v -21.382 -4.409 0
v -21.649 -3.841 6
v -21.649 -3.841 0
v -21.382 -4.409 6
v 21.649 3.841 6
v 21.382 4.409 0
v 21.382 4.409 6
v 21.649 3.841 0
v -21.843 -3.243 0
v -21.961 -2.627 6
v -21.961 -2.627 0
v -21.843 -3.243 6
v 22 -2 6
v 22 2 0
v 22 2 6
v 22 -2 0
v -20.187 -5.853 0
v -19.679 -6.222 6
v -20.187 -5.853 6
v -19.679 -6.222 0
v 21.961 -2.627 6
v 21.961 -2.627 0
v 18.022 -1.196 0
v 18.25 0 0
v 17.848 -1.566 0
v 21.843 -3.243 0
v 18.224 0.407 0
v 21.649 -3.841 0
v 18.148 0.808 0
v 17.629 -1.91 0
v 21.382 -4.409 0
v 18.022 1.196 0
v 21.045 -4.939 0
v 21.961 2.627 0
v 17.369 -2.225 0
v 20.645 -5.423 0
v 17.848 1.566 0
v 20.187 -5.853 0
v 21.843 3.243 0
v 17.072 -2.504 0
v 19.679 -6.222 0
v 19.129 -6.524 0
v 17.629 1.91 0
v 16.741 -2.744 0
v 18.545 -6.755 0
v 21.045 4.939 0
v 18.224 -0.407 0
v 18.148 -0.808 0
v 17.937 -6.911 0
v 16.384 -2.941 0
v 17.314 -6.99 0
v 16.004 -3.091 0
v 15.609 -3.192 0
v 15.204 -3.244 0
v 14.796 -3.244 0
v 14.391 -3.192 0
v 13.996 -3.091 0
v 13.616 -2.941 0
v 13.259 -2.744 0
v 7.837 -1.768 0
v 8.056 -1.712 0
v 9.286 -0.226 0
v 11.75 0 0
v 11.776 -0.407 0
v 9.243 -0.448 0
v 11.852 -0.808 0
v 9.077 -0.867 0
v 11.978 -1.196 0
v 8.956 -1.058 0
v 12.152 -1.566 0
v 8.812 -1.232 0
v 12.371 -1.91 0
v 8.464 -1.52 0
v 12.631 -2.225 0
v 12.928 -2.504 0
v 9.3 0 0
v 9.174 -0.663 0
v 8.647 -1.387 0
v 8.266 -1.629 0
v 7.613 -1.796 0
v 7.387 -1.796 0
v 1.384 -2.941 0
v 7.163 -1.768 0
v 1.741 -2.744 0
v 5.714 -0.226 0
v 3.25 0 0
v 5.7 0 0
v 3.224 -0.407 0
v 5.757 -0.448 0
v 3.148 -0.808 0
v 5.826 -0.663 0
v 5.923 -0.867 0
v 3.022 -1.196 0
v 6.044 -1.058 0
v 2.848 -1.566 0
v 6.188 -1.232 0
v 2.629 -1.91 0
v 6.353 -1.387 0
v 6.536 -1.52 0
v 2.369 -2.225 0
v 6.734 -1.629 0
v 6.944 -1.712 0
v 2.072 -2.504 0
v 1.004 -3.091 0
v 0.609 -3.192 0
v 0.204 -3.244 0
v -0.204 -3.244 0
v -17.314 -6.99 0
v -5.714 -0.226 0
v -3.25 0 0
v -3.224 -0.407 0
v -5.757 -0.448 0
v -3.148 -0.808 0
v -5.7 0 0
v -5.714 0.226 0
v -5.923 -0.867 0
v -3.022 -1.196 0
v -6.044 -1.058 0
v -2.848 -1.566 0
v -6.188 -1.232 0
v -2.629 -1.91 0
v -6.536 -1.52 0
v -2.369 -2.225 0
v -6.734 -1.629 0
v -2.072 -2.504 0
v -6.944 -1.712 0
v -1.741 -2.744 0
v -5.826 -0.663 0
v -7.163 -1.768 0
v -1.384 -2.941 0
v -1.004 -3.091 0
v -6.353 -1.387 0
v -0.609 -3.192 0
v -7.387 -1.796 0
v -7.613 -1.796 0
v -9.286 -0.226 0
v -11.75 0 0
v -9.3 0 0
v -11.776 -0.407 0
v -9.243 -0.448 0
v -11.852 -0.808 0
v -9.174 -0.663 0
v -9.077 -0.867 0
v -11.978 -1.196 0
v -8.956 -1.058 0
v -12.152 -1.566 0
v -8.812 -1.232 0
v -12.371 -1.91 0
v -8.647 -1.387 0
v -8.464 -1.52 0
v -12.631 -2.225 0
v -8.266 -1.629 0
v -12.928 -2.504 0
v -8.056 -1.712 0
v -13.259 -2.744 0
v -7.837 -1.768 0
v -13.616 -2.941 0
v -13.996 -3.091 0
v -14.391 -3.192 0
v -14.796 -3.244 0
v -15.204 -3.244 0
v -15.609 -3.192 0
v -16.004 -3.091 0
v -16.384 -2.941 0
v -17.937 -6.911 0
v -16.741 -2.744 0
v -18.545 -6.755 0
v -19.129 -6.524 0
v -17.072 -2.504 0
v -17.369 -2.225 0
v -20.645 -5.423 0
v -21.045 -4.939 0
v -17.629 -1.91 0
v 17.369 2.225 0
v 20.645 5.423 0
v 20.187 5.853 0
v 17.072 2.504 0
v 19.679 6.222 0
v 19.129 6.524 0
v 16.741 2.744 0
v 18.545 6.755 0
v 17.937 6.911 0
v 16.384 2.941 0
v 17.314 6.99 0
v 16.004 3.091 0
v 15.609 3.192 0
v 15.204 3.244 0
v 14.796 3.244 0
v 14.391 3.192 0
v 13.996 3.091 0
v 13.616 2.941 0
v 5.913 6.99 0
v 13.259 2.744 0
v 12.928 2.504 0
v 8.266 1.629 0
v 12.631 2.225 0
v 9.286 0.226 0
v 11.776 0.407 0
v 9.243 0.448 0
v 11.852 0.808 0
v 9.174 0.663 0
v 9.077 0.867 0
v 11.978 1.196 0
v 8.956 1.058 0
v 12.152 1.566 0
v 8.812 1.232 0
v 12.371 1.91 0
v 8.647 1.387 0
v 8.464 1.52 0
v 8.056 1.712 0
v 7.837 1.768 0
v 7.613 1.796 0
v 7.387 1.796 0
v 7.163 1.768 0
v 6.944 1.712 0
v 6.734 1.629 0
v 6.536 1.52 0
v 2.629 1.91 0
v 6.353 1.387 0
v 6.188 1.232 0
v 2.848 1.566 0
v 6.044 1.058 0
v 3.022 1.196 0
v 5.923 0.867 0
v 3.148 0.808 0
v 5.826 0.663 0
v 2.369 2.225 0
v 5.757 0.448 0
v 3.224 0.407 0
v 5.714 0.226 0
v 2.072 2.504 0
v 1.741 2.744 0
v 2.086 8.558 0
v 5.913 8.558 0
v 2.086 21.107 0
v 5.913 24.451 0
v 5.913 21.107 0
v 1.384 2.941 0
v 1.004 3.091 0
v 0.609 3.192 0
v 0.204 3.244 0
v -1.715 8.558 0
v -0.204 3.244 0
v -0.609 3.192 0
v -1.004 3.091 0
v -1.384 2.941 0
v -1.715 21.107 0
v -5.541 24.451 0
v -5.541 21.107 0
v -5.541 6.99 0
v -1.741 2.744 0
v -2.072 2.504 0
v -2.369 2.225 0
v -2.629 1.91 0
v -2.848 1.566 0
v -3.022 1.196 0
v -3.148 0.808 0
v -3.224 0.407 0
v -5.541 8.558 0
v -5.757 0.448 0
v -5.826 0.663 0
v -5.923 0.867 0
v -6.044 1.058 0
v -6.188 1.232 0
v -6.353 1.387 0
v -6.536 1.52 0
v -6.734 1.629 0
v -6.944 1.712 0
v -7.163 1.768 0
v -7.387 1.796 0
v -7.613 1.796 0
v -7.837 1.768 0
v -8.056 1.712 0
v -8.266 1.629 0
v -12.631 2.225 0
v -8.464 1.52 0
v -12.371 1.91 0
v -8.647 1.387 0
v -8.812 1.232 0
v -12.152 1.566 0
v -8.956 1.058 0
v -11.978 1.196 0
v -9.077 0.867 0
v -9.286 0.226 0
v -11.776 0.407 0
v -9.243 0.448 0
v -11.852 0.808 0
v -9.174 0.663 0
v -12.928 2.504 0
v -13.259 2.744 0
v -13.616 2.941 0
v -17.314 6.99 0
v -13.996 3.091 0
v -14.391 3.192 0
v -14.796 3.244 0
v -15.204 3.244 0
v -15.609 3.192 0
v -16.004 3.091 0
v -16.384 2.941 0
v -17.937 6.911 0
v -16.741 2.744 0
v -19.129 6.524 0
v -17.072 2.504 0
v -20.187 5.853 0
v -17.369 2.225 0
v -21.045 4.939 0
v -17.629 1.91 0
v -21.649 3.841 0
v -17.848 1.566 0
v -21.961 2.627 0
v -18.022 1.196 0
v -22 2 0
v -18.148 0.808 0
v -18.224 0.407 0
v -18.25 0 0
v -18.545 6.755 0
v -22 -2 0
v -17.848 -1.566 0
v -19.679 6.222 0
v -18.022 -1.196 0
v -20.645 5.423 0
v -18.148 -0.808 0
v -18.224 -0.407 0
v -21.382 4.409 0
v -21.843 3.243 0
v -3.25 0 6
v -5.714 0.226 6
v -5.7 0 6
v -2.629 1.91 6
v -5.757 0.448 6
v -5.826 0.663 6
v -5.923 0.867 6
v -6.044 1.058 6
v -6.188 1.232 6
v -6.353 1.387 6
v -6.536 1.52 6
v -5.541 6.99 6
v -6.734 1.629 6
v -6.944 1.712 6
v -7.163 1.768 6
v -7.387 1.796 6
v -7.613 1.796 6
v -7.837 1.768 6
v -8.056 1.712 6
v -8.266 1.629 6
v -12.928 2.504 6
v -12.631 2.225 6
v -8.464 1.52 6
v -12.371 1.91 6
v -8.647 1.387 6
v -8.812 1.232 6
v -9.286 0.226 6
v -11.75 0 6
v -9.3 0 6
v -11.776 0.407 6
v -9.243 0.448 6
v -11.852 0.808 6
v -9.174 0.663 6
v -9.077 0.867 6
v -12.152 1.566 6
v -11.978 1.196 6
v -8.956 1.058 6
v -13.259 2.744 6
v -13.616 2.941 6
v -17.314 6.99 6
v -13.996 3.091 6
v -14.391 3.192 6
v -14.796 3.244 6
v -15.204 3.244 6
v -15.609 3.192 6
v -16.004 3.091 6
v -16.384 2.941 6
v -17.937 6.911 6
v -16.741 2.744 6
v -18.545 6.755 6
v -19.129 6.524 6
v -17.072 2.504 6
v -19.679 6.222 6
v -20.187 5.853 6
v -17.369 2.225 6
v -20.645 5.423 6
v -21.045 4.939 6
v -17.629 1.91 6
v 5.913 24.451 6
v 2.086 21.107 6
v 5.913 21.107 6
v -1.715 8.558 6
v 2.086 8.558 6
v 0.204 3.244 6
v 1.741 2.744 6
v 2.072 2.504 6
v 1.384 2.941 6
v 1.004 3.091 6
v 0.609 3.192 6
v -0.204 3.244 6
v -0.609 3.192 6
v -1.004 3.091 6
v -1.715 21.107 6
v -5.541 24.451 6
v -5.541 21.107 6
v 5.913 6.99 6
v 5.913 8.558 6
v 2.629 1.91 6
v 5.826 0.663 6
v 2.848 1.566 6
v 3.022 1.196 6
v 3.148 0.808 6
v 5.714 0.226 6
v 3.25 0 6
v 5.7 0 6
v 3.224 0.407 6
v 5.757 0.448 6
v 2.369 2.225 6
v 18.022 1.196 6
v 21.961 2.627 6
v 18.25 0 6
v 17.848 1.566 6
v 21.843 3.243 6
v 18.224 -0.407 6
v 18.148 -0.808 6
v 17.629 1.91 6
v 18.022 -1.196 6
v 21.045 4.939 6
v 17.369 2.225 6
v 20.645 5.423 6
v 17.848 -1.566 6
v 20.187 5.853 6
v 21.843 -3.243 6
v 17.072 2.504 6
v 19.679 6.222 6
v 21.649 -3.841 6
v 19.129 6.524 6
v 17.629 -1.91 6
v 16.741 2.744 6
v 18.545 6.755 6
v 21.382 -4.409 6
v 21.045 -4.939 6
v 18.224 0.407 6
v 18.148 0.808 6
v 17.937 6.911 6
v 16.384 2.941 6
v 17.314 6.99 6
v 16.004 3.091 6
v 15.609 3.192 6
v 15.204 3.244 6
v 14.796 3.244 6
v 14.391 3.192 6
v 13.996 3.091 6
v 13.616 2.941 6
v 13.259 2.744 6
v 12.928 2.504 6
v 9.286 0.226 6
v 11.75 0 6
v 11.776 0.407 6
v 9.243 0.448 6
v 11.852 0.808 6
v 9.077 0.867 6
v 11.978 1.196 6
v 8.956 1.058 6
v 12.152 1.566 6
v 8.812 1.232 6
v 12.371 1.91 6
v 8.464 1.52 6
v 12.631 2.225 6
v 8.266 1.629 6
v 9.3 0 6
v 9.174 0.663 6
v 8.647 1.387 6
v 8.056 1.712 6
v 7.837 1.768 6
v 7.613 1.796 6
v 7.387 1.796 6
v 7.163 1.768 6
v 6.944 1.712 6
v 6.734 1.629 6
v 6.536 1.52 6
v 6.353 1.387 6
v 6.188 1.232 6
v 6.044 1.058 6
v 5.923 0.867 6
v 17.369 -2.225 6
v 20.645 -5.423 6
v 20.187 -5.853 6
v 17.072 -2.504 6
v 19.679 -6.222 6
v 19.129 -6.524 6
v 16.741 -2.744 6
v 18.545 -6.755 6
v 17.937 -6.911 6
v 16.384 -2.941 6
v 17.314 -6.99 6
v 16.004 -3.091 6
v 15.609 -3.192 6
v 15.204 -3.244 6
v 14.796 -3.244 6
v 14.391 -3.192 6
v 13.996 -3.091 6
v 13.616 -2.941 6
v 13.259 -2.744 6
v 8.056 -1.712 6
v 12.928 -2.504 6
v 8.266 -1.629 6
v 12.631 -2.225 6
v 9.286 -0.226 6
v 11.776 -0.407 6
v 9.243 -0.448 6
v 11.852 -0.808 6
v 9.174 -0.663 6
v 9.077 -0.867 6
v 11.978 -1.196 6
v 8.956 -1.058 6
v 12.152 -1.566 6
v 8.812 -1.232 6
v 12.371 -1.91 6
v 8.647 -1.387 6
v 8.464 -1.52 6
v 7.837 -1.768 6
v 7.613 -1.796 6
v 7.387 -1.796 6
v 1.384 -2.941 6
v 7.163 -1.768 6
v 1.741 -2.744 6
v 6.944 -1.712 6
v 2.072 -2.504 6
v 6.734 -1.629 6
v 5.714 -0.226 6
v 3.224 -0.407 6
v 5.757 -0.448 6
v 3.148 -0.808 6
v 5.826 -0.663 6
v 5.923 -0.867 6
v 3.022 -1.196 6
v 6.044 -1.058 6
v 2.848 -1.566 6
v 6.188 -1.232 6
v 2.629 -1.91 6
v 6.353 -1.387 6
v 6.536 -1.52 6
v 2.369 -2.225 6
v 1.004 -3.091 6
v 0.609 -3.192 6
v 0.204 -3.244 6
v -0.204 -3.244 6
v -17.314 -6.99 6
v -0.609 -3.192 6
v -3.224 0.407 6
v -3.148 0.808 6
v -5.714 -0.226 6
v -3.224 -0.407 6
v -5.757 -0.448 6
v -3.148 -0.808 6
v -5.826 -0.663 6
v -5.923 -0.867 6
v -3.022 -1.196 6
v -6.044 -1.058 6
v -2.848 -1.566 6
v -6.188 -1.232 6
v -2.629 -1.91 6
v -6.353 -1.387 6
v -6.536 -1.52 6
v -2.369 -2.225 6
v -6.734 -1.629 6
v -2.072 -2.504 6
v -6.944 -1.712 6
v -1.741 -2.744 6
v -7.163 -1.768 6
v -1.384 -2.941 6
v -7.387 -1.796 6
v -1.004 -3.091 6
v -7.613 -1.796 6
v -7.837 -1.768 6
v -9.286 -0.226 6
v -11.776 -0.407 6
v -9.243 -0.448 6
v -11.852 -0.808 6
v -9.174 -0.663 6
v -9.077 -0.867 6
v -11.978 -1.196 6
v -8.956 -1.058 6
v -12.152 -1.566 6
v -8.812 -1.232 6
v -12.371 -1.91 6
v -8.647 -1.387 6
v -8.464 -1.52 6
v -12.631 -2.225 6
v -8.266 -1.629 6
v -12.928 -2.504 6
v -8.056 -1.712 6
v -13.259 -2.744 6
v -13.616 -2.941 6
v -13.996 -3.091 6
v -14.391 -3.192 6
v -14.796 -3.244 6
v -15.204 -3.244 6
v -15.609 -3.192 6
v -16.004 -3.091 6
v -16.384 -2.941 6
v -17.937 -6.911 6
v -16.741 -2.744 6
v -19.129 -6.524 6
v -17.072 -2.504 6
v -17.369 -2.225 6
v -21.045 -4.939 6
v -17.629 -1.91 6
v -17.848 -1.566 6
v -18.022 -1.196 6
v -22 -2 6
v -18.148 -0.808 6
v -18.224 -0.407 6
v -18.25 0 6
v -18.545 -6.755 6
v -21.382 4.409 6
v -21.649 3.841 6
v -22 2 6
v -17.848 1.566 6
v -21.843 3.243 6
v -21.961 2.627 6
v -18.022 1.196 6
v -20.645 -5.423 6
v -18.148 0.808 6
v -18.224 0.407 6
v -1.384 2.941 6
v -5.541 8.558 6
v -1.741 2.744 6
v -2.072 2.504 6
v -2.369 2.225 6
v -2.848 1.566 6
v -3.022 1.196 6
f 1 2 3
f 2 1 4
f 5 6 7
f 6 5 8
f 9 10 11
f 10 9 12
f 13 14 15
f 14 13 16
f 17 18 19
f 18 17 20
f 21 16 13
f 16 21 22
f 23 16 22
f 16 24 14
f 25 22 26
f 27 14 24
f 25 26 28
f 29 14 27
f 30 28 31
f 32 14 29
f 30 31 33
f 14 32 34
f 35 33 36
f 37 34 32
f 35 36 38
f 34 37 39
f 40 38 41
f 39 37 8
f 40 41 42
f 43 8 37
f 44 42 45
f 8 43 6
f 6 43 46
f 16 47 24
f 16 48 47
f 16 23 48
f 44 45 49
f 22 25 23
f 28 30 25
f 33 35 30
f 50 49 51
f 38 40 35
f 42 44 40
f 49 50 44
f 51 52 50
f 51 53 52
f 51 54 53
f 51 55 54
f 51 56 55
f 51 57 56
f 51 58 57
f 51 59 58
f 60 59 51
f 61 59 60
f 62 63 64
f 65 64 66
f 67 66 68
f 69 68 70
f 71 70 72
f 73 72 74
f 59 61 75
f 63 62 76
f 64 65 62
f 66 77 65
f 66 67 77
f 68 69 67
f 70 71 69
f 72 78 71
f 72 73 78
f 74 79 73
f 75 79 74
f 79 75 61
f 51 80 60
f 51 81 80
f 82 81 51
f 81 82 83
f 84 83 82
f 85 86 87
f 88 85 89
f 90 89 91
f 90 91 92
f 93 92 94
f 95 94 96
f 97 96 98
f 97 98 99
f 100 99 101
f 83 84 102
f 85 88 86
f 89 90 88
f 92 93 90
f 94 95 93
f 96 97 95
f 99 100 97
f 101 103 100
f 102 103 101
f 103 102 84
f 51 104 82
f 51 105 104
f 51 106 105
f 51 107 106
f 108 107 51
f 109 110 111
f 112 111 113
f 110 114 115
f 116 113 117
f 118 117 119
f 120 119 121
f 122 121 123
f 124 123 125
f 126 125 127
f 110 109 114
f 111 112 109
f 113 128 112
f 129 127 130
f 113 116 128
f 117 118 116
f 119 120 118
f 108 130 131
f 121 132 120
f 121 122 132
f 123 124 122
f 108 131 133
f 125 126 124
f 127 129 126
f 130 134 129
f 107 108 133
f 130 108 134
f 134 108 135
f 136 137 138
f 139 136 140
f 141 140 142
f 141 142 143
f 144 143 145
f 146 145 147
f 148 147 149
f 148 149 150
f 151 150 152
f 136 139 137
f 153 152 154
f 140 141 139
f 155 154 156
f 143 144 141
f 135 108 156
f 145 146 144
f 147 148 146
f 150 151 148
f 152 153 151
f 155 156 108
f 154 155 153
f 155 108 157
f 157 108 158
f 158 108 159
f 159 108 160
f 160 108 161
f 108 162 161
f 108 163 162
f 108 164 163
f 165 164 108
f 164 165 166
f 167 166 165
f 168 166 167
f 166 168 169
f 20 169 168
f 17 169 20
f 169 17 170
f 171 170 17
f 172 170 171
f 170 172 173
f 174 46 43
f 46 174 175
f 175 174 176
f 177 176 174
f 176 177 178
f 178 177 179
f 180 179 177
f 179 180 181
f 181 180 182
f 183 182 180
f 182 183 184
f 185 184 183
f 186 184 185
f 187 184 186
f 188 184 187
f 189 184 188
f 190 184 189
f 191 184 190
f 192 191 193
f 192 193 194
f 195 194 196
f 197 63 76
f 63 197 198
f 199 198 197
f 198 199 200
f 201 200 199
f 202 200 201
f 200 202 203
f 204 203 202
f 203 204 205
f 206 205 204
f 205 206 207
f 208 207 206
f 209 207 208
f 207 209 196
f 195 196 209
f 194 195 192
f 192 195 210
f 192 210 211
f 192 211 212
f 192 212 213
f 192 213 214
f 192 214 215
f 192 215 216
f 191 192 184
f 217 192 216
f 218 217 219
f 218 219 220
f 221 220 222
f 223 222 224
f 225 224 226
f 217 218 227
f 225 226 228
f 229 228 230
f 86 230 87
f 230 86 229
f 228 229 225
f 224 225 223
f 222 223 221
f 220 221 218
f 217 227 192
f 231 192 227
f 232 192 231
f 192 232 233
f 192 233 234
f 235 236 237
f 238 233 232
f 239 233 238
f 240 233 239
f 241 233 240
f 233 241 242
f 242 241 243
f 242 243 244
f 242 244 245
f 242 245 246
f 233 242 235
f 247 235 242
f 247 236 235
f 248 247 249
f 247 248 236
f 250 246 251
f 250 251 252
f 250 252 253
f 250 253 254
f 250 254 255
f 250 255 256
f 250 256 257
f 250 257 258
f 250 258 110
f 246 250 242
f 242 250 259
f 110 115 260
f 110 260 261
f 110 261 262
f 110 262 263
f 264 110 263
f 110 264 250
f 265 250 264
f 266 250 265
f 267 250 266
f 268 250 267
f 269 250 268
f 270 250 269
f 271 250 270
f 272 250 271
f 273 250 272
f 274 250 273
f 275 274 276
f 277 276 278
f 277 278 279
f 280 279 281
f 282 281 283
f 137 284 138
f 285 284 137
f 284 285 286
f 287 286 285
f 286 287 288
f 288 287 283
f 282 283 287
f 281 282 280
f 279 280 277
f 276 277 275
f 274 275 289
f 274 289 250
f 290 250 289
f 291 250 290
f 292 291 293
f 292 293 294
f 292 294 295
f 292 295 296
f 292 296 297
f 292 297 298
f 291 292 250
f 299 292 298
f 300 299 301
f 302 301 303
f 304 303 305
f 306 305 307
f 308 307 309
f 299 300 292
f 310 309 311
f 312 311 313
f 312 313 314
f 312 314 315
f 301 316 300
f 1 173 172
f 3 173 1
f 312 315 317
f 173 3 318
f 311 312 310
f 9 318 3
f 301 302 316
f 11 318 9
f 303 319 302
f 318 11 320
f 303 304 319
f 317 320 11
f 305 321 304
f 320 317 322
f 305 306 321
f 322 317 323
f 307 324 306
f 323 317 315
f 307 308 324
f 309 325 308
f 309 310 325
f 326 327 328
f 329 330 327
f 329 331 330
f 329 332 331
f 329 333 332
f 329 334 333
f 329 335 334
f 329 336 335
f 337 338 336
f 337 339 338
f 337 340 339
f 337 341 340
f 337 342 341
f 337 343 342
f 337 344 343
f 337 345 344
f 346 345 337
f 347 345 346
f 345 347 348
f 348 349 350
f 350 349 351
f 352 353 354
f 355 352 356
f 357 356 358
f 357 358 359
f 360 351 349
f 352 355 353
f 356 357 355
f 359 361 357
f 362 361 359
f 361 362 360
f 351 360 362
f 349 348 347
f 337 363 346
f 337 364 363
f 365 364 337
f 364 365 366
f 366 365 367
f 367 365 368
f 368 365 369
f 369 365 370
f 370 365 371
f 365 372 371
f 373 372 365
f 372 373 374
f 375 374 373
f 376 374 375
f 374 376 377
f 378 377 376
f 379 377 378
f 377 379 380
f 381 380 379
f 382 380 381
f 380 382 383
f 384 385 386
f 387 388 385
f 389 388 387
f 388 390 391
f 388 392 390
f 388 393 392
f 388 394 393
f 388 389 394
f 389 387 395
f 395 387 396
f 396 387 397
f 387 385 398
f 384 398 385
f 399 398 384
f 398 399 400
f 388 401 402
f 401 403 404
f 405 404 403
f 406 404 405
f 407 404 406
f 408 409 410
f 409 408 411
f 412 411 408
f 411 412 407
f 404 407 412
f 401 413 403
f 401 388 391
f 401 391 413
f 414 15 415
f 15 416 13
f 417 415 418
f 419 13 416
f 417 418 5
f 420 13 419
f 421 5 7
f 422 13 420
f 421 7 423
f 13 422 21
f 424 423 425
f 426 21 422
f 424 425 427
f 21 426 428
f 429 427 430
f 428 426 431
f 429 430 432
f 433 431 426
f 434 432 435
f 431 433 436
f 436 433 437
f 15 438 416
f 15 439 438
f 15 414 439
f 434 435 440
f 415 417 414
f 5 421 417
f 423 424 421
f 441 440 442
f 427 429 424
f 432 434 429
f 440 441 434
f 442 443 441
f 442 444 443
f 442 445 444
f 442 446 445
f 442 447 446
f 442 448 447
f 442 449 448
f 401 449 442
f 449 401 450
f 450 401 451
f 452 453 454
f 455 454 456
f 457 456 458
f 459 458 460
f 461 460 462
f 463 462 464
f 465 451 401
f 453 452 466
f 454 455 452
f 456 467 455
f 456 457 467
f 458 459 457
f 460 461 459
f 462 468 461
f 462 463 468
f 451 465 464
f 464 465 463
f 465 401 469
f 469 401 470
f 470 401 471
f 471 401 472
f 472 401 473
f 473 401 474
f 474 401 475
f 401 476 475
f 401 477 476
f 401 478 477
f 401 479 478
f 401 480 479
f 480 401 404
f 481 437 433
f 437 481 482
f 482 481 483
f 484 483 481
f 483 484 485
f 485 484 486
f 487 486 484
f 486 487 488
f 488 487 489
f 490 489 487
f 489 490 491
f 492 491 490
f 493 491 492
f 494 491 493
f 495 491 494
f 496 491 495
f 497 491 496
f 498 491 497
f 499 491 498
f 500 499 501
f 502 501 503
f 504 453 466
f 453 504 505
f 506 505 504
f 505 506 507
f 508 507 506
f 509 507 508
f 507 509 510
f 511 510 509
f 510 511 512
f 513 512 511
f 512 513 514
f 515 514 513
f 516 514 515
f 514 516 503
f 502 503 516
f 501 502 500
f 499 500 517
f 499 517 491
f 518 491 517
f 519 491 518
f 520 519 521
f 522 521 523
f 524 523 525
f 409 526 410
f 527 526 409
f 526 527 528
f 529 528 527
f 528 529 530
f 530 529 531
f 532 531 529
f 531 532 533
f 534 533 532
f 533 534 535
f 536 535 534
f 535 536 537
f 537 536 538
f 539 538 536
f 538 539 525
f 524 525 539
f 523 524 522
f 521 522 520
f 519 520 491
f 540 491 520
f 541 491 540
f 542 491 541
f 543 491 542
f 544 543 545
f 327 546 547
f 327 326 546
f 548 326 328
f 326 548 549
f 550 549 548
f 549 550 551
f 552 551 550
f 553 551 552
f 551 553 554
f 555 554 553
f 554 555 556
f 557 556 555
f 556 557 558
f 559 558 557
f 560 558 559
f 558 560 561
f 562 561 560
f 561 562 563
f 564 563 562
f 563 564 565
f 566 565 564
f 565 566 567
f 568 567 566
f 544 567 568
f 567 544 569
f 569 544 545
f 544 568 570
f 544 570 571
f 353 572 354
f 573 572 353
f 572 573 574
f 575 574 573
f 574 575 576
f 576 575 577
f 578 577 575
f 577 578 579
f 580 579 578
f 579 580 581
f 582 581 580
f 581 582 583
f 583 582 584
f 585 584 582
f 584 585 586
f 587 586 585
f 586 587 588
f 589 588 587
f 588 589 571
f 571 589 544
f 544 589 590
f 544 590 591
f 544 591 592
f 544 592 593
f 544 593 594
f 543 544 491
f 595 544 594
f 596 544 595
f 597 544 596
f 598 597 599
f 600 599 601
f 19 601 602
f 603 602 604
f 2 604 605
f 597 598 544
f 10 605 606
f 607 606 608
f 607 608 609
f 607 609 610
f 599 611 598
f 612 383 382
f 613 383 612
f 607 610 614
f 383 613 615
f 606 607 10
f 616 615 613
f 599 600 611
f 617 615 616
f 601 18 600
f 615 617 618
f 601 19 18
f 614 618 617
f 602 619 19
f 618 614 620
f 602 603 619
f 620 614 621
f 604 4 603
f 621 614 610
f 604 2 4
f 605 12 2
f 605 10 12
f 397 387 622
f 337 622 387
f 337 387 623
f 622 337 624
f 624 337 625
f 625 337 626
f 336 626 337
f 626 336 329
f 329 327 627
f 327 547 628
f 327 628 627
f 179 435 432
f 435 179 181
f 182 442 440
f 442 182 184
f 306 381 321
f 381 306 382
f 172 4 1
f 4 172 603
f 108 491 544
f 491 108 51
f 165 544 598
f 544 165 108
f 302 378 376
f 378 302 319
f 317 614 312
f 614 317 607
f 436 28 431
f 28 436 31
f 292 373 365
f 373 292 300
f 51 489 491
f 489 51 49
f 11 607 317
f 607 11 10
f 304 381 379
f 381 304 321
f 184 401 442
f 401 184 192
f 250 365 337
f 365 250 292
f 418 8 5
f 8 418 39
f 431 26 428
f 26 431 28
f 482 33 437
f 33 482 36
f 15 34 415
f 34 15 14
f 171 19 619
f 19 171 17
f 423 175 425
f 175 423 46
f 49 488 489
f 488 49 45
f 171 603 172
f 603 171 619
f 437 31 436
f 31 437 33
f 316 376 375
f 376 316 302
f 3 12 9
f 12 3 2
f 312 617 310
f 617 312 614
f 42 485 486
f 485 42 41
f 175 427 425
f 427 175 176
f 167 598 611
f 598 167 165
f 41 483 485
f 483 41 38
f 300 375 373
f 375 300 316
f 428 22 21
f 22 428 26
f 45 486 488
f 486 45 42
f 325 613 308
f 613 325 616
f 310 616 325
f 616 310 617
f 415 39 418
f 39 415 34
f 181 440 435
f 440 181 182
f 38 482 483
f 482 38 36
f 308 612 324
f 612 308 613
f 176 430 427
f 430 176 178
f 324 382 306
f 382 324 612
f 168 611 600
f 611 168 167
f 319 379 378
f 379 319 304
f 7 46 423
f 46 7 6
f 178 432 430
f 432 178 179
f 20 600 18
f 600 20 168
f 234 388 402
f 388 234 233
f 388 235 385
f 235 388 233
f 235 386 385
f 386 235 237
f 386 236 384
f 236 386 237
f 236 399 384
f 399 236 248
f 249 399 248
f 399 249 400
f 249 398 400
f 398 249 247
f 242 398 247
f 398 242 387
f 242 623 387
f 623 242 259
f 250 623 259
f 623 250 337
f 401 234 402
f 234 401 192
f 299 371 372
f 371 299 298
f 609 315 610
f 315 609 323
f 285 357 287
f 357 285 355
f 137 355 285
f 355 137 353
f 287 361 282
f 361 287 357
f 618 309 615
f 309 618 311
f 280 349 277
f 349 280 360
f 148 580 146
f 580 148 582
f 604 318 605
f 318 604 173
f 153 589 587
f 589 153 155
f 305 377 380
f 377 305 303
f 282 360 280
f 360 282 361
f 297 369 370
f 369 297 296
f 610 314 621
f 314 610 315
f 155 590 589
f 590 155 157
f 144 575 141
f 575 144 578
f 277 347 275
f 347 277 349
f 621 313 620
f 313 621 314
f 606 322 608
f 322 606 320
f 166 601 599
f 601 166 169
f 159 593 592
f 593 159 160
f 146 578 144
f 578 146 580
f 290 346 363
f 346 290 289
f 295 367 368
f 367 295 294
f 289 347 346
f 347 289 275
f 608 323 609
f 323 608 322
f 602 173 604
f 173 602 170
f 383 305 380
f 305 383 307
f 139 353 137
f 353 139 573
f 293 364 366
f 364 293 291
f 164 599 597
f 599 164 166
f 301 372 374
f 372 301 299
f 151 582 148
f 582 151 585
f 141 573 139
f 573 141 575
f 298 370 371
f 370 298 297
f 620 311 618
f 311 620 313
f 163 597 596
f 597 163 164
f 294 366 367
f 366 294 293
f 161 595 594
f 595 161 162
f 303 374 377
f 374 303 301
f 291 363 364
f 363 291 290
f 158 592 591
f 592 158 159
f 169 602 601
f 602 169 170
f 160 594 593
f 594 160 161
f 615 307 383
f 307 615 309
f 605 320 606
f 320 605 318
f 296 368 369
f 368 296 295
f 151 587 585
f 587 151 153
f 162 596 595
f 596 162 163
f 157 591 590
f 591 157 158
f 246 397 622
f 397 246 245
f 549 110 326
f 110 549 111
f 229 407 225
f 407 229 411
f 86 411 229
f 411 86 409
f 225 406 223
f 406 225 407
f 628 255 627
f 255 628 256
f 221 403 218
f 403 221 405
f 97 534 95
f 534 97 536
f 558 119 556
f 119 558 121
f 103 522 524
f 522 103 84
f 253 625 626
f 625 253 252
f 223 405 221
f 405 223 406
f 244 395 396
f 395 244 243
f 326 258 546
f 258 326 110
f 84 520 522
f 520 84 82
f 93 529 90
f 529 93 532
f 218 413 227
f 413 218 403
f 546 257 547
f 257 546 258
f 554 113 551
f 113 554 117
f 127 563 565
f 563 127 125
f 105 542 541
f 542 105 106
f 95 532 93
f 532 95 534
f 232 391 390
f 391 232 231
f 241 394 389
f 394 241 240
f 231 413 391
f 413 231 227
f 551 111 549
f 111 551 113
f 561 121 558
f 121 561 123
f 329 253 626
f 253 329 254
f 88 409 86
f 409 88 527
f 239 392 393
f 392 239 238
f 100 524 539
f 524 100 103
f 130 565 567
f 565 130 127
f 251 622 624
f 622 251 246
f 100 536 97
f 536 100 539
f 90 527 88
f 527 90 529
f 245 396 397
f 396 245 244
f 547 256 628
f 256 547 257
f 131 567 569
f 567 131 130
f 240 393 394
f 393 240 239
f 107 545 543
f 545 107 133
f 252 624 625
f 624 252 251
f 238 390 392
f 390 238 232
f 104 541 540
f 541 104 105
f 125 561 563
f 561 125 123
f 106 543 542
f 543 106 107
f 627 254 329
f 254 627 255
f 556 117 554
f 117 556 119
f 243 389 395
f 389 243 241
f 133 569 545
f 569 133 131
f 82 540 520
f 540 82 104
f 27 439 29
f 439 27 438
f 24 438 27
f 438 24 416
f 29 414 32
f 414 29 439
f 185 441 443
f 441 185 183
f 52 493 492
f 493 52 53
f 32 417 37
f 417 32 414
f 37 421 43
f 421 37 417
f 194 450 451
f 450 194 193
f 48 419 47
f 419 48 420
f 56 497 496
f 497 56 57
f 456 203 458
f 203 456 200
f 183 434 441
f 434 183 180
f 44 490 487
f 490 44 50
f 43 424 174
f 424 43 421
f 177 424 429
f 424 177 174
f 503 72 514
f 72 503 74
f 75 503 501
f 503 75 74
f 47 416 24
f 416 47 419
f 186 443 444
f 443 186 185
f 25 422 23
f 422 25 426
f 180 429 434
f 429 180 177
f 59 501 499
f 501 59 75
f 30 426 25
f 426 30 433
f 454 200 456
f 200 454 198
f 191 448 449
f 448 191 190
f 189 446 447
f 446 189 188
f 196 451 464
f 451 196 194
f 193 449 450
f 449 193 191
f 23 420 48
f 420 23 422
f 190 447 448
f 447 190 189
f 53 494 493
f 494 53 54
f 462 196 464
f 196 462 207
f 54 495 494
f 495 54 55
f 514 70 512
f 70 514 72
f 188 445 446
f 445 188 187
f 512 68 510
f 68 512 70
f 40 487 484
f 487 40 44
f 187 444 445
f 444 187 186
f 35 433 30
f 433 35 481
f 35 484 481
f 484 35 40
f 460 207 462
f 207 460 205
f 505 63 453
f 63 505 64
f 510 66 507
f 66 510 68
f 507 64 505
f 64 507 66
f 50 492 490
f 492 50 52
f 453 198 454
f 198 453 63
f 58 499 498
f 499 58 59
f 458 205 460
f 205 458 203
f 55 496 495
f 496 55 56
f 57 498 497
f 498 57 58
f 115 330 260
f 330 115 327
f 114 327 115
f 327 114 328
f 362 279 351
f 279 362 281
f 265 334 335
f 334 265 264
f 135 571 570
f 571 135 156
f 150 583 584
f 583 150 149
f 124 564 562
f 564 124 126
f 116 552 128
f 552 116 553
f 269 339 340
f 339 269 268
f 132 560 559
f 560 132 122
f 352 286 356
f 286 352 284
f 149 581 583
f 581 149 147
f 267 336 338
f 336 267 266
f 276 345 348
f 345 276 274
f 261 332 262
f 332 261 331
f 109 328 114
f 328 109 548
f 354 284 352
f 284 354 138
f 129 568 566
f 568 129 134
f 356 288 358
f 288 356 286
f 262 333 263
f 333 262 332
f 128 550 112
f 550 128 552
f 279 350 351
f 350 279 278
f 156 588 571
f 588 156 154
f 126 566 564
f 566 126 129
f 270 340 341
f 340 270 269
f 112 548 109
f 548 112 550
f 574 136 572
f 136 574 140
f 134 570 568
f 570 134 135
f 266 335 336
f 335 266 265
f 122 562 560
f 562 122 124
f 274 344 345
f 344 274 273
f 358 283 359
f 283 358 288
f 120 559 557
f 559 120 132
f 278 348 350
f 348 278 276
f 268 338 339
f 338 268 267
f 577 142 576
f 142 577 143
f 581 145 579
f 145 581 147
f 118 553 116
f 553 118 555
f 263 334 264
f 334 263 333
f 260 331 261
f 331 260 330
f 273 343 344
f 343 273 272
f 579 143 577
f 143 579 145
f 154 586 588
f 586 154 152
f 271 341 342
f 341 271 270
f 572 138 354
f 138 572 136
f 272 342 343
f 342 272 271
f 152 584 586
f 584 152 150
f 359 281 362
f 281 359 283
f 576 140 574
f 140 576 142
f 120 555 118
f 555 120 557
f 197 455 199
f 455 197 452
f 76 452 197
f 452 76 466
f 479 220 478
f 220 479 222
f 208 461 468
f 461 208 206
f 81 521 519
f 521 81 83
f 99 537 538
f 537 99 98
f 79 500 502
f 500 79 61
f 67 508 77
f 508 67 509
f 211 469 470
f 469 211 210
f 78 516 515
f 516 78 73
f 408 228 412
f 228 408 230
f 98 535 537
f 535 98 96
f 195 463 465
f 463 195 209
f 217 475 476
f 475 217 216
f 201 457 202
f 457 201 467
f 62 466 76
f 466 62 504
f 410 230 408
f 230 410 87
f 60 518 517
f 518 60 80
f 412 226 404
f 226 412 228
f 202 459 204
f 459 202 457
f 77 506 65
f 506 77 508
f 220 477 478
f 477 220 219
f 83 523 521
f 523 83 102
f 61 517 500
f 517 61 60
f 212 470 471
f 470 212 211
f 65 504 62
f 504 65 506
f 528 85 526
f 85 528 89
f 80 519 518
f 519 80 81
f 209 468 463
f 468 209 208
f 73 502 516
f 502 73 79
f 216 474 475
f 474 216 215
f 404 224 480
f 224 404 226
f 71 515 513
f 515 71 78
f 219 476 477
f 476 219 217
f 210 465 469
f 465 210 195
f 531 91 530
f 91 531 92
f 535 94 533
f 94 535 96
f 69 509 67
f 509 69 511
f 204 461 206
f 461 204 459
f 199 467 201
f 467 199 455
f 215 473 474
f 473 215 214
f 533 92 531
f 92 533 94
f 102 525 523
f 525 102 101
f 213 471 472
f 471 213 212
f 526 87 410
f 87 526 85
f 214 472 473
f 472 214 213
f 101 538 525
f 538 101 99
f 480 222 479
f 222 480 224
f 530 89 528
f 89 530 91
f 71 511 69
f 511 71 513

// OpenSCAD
$fn = 50;


difference() {
	union() {
		hull() {
			translate(v = [-17.0000000000, 2.0000000000, 0]) {
				cylinder(h = 6, r = 5);
			}
			translate(v = [17.0000000000, 2.0000000000, 0]) {
				cylinder(h = 6, r = 5);
			}
			translate(v = [-17.0000000000, -2.0000000000, 0]) {
				cylinder(h = 6, r = 5);
			}
			translate(v = [17.0000000000, -2.0000000000, 0]) {
				cylinder(h = 6, r = 5);
			}
		}
		translate(v = [0, 24, 0]) {
			linear_extrude(height = 6) {
				text(font = "DejaVu Sans Mono:style=Bold", halign = "center", size = 19.0000000000, text = "I", valign = "top");
			}
		}
	}
	union() {
		translate(v = [-15.0000000000, 0.0000000000, 0]) {
			translate(v = [0, 0, -100]) {
				cylinder(h = 200, r = 3.2500000000);
			}
		}
		translate(v = [0, 0, -100]) {
			cylinder(h = 200, r = 3.2500000000);
		}
		translate(v = [15.0000000000, 0.0000000000, 0]) {
			translate(v = [0, 0, -100]) {
				cylinder(h = 200, r = 3.2500000000);
			}
		}
		translate(v = [-15.0000000000, 0.0000000000, 0]) {
			translate(v = [0, 0, -100]) {
				cylinder(h = 200, r = 1.8000000000);
			}
		}
		translate(v = [-7.5000000000, 0.0000000000, 0]) {
			translate(v = [0, 0, -100]) {
				cylinder(h = 200, r = 1.8000000000);
			}
		}
		translate(v = [0, 0, -100]) {
			cylinder(h = 200, r = 1.8000000000);
		}
		translate(v = [7.5000000000, 0.0000000000, 0]) {
			translate(v = [0, 0, -100]) {
				cylinder(h = 200, r = 1.8000000000);
			}
		}
		translate(v = [15.0000000000, 0.0000000000, 0]) {
			translate(v = [0, 0, -100]) {
				cylinder(h = 200, r = 1.8000000000);
			}
		}
	}
}
